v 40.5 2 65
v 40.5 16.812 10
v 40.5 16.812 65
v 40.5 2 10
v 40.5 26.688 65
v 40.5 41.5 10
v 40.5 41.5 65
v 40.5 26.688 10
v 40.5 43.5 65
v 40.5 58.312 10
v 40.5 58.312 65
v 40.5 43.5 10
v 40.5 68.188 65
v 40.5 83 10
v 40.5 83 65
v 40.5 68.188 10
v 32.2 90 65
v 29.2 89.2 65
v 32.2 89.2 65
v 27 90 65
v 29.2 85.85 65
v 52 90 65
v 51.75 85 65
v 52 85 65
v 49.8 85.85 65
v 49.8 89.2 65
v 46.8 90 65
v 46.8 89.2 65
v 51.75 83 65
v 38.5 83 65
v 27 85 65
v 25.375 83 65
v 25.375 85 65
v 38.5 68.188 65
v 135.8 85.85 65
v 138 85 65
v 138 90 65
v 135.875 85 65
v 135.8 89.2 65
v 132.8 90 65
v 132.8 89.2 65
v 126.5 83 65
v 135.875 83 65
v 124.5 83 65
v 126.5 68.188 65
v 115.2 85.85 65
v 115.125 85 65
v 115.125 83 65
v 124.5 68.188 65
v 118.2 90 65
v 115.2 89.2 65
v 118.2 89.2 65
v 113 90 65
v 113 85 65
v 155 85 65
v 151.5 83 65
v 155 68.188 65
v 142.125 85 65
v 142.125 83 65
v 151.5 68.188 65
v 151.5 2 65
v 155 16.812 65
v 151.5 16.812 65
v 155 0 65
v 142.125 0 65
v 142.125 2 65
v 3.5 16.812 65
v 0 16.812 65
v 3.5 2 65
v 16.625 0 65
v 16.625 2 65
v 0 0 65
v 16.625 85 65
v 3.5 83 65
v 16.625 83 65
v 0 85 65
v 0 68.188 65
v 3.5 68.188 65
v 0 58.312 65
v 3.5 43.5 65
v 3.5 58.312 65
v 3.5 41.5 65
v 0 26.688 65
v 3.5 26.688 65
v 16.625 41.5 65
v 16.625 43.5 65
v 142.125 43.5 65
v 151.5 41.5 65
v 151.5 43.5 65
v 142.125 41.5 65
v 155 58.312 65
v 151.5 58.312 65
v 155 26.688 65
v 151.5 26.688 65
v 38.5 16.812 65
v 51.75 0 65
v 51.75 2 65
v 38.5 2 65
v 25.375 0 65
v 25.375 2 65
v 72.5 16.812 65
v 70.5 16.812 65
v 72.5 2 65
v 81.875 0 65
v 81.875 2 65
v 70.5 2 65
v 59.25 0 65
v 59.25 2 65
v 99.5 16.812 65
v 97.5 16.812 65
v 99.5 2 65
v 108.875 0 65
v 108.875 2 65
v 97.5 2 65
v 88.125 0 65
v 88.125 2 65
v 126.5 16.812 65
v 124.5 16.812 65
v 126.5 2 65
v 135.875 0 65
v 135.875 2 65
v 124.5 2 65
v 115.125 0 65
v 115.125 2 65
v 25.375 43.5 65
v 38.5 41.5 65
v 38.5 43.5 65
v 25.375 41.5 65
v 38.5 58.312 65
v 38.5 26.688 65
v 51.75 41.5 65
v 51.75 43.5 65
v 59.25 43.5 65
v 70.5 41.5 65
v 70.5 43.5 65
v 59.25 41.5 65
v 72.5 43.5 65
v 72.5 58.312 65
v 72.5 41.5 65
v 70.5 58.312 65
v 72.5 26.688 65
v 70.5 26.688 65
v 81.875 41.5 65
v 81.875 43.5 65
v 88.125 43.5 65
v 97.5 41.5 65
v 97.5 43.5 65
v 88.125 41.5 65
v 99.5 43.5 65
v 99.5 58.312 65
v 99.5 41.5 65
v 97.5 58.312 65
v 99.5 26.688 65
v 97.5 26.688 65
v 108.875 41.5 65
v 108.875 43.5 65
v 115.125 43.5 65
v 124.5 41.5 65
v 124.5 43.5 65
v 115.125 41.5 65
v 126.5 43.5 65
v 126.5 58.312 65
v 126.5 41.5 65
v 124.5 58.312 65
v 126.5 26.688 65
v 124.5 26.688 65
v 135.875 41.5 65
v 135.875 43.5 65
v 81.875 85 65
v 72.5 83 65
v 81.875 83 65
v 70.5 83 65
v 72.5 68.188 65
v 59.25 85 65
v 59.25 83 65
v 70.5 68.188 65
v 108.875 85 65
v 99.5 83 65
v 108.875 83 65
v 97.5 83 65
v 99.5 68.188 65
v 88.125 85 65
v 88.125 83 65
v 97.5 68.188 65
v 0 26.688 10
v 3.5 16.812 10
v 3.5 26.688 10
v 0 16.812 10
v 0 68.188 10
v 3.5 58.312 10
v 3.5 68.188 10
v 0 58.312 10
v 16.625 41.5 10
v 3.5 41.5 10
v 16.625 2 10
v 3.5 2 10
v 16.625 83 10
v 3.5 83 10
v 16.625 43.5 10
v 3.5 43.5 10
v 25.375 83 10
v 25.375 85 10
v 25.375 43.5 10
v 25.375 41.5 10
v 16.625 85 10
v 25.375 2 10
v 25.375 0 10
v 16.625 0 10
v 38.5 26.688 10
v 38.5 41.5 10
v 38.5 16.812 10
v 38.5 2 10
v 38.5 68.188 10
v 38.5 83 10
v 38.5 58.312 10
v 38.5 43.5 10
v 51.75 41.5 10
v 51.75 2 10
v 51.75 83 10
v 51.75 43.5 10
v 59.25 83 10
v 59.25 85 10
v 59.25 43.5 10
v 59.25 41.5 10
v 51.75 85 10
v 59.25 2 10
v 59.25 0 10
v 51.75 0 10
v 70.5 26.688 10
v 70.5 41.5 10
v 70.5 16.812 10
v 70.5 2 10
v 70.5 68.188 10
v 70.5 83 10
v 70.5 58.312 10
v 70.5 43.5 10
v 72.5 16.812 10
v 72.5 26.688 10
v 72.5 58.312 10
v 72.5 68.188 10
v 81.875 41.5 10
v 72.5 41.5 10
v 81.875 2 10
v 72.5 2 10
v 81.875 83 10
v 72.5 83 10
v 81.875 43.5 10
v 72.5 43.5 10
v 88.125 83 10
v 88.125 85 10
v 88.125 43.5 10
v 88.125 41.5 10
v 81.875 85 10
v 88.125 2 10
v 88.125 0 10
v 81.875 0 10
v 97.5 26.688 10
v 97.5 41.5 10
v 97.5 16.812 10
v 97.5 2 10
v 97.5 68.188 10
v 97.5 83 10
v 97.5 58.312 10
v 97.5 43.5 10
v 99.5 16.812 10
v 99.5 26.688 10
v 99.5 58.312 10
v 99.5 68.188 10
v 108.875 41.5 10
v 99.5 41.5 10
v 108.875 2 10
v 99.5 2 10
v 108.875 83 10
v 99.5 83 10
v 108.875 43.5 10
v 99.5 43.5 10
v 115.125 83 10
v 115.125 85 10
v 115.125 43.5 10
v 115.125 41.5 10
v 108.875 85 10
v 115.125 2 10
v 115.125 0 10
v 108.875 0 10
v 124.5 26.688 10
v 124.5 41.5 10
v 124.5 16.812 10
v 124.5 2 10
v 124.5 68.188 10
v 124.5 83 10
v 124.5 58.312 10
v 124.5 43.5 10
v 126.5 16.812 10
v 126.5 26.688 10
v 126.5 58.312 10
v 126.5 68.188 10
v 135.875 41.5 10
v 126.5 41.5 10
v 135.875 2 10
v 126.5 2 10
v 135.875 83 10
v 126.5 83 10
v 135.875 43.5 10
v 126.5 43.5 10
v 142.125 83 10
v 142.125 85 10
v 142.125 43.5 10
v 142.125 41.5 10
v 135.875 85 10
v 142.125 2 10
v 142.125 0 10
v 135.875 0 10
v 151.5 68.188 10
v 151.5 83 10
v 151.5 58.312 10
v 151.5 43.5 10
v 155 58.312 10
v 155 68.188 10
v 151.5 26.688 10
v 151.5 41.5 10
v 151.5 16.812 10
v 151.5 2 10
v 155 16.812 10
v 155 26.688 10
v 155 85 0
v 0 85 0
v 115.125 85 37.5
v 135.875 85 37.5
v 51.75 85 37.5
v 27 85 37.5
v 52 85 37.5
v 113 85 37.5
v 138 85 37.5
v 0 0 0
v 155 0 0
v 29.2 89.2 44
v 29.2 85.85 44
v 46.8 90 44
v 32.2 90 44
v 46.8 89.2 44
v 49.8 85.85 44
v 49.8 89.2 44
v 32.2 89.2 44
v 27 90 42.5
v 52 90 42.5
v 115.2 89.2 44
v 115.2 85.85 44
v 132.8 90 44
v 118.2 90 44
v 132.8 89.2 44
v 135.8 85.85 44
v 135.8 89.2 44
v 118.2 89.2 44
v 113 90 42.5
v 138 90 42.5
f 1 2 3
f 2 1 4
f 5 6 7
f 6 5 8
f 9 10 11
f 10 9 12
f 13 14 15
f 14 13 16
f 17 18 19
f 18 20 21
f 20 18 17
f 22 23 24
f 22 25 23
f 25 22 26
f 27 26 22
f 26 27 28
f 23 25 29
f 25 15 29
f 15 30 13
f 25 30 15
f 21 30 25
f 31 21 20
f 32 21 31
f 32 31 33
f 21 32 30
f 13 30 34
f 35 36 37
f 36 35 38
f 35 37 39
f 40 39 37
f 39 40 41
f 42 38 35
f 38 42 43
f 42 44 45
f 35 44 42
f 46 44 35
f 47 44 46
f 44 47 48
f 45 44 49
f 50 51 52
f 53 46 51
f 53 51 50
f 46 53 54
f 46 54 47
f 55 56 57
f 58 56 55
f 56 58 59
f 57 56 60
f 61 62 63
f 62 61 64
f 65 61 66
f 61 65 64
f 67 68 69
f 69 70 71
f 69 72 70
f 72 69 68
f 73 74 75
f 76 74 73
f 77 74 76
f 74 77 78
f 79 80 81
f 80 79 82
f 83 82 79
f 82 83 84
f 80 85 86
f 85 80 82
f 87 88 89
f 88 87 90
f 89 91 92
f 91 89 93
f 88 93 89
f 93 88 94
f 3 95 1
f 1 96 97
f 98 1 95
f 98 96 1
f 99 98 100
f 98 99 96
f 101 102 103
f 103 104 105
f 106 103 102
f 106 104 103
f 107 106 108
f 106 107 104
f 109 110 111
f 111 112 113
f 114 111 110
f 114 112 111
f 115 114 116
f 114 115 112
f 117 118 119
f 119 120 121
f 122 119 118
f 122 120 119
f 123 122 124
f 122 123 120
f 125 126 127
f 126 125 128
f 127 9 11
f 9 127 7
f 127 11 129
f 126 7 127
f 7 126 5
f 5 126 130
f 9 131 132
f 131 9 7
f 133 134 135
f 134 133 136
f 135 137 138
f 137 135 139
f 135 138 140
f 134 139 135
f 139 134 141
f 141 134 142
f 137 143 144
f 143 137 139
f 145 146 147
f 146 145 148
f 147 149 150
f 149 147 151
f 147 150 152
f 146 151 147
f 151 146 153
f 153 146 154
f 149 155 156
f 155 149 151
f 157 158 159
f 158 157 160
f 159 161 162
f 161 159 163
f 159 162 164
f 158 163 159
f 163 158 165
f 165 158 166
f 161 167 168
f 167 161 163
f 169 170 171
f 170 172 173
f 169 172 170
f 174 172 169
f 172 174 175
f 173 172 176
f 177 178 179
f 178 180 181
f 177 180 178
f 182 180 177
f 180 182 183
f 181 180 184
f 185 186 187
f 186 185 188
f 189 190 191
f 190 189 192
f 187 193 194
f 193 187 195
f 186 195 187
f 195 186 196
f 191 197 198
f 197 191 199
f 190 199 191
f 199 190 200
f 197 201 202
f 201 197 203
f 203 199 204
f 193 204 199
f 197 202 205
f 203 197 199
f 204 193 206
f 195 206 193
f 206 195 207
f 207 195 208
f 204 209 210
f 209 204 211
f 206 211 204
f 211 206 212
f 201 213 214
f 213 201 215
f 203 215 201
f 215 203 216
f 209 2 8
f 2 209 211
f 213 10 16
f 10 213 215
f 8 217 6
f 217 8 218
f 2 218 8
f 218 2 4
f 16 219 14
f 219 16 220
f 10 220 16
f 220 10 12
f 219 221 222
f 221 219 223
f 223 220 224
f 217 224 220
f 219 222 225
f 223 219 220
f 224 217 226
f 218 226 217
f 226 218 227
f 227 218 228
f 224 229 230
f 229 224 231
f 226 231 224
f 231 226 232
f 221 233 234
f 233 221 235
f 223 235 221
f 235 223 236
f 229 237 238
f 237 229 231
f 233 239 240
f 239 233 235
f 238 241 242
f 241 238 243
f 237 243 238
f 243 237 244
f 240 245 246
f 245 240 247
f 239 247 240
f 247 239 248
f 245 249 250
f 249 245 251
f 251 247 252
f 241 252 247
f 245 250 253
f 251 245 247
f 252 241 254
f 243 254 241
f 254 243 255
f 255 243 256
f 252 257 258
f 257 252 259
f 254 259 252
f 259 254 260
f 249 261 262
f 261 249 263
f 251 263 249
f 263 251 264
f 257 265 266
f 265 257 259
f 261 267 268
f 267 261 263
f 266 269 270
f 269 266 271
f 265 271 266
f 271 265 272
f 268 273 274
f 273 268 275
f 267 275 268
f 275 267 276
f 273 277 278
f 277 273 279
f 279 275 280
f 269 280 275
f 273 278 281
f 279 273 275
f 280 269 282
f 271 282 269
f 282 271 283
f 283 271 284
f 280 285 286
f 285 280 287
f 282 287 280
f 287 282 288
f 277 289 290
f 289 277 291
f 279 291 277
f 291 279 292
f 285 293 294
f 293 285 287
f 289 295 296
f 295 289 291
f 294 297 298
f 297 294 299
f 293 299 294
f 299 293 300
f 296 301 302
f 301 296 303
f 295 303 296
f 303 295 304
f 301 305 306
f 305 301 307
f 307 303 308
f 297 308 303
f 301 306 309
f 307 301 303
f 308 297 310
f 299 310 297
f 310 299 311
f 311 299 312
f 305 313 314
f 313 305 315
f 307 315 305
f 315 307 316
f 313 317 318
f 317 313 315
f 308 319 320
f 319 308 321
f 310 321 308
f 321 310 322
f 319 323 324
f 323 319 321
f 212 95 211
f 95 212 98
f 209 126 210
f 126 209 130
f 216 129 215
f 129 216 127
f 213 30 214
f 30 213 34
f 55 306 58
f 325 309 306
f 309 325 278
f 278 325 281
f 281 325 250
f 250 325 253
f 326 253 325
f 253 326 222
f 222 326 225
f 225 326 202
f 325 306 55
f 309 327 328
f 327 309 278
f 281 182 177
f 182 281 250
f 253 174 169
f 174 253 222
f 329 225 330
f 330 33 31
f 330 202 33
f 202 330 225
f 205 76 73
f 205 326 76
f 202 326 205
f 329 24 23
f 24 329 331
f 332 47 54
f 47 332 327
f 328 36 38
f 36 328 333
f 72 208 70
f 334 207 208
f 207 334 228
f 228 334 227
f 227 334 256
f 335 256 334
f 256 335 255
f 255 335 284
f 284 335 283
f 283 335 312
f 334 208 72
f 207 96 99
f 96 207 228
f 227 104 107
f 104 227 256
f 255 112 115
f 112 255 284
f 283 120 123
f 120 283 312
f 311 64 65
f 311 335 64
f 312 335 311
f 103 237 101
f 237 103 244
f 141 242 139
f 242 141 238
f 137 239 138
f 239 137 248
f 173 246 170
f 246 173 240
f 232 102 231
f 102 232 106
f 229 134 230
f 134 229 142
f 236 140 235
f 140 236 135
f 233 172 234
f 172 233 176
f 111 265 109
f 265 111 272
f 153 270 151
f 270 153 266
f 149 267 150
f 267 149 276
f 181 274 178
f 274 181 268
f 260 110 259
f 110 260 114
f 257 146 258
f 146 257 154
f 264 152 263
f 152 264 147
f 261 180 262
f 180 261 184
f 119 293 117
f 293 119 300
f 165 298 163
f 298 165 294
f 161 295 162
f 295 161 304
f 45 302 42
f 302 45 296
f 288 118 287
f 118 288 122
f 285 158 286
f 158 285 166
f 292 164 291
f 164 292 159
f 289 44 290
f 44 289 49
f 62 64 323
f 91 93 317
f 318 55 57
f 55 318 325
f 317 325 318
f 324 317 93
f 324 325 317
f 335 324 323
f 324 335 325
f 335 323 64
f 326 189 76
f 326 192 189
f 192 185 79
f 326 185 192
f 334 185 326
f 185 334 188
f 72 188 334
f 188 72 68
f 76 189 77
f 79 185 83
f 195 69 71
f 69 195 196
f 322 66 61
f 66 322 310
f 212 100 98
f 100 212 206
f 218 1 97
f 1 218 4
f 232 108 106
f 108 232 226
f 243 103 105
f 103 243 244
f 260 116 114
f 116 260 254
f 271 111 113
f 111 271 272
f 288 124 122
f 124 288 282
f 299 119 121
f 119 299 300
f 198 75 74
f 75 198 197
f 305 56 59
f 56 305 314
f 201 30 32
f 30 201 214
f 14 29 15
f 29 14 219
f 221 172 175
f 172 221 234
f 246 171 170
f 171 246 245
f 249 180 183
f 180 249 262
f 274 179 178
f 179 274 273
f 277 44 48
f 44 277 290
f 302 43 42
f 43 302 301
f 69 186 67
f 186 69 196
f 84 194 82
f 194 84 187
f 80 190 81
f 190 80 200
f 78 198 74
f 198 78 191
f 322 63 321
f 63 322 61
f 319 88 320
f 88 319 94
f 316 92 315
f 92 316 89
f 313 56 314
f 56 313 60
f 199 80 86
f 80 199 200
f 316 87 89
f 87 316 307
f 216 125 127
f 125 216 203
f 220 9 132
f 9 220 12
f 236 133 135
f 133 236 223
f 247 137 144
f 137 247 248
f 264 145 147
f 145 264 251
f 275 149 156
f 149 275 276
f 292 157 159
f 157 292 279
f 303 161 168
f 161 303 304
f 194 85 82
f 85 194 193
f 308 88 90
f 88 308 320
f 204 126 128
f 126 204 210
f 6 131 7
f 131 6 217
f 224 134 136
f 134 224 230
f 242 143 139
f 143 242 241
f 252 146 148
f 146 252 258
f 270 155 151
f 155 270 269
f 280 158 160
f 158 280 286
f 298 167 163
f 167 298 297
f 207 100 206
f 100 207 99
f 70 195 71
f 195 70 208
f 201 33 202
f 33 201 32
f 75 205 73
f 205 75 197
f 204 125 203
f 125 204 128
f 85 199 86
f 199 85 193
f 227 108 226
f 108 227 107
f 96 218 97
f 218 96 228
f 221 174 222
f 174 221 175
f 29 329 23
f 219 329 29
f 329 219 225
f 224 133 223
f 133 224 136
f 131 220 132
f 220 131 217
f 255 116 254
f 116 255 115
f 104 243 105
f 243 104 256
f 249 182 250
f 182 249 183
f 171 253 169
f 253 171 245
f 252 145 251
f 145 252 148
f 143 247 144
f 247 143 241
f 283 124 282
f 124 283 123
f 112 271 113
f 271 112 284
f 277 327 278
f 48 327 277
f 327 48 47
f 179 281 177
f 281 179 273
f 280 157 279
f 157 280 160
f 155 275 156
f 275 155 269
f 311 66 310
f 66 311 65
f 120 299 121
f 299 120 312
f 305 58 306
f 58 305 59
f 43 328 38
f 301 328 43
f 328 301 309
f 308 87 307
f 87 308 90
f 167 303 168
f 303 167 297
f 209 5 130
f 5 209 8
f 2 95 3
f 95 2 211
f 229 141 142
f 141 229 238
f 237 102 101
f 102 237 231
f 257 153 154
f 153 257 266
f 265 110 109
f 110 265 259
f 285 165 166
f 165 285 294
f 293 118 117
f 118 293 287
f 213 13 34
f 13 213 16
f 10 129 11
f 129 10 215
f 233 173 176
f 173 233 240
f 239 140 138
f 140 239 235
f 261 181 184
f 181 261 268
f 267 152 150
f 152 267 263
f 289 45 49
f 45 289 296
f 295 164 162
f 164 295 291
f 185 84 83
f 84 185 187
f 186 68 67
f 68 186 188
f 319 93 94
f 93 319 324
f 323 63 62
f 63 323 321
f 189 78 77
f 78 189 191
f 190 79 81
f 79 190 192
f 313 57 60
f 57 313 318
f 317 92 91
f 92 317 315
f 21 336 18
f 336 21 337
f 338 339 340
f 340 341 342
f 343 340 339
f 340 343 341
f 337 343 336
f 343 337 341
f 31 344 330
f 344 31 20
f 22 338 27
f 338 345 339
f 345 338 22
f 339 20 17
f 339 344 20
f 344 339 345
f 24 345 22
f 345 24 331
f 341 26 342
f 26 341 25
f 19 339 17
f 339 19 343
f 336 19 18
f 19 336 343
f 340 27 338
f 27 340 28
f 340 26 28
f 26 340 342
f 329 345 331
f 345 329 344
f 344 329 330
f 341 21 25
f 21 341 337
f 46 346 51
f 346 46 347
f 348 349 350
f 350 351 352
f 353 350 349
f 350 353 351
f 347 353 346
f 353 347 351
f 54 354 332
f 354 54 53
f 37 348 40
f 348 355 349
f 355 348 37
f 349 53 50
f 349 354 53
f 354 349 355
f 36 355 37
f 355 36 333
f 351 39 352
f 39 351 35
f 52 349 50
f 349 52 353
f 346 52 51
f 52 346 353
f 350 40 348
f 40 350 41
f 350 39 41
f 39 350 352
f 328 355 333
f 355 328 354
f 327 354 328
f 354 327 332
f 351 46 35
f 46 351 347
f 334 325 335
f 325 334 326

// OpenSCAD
// Tube Holder: 2 x 5 medicine/ointment tube organizer
// Units: millimeters. Designed for FDM printing flat on its base.
// SPDX-License-Identifier: GPL-3.0-or-later

/* [Overall dimensions] */
width = 155;             // X: left to right
depth = 85;             // Y: front to back
height = 65;             // Total external height, INCLUDING base
base_thickness = 10;     // Solid, unperforated base geometry

/* [Compartments and walls] */
column_widths = [35, 30, 25, 25, 25]; // Clear inside widths, left to right
rows = 2;
wall_thickness = 2;     // Internal divider and front/back wall thickness
slot_fraction = 0.25;   // Fraction of each cell-facing wall span omitted

/* [Back-wall magnet slides] */
magnet_diameter = 20;          // Nominal round magnet diameter
magnet_thickness = 3;         // Nominal magnet thickness
magnet_offset = 5;            // Distance that pocket extends behind original back face
magnet_slot_drop_fraction = 0.5; // Lowest pocket point, relative to exposed wall height
magnet_diameter_clearance = 0.6; // Total side-to-side clearance
magnet_thickness_clearance = 0.35; // Extra fore-aft clearance
magnet_pocket_width = 25;     // Outside width of each pocket, along long back wall
magnet_rear_lip = 0.8;        // Retaining lip thickness facing cabinet (creates small magnet-to-metal gap)
magnet_rear_lip_overlap = 3.0; // Wide clip tabs overlap each edge by 3 mm
magnet_shelf_thickness = 1.5; // Bottom stop above 45-degree supporting ramp

/* [Fit checks] */
maximum_tube_diameter = 33; // Fits in 35-mm columns only
minimum_tube_diameter = 23; // Fits in 25-mm columns
minimum_fit_clearance = 1.5;  // Minimum clearance across a suitable cell

/* [Preview only] */
show_tube_proxies = false;   // Ghost reference tubes in OpenSCAD preview; never exported

/* [Hidden] */
$fn = 48;
_eps = 0.02;
function widths_sum(i = 0) = i >= len(column_widths) ? 0 : column_widths[i] + widths_sum(i + 1);
function widths_before(c, i = 0) = i >= c ? 0 : column_widths[i] + widths_before(c, i + 1);
columns = len(column_widths);
// Distribute the extra 3 mm to the two side walls, keeping cell sizes exact.
side_wall_thickness = (width - widths_sum() - (columns - 1) * wall_thickness) / 2;
cell_depth = (depth - (rows + 1) * wall_thickness) / rows;
wall_height = height - base_thickness;
magnet_open_width = magnet_diameter + magnet_diameter_clearance;
magnet_open_depth = magnet_thickness + magnet_thickness_clearance;
magnet_side_width = (magnet_pocket_width - magnet_open_width) / 2;
magnet_front_web = magnet_offset - magnet_open_depth - magnet_rear_lip;
magnet_pocket_low_z = height - magnet_slot_drop_fraction * wall_height;
magnet_ramp_height = magnet_offset; // 45 degrees: 5 mm rise over 5 mm outward
magnet_channel_bottom_z = magnet_pocket_low_z + magnet_ramp_height + magnet_shelf_thickness;

assert(columns >= 1 && rows >= 1, "At least one row and column are required");
assert(wall_thickness > 0 && base_thickness > 0 && wall_height > 0,
       "All thicknesses and exposed wall height must be positive");
assert(slot_fraction >= 0 && slot_fraction < 0.8,
       "Slot fraction must be between 0 and 0.8");
assert(magnet_offset > magnet_thickness + magnet_thickness_clearance + magnet_rear_lip + 0.8,
       "Magnet offset too small to fit magnet with usable front web");
assert(magnet_side_width >= 1.5, "Magnet cassette side rails are too narrow");
assert(magnet_rear_lip_overlap > 0 &&
       2 * magnet_rear_lip_overlap < magnet_open_width - 4,
       "Rear clips must leave an open magnet face");
assert(columns >= 3, "Two outer dividers are needed for magnet positions");
assert(magnet_pocket_width <= min(column_widths[0] + column_widths[1],
                                 column_widths[columns - 2] + column_widths[columns - 1]),
       "Magnet cassette must span adjacent columns at the two outer dividers");
assert(height - magnet_channel_bottom_z >= magnet_diameter + 0.5,
       "Slide is too short for a round magnet; reduce ramp/shelf or increase drop");
assert(side_wall_thickness >= wall_thickness,
       "Overall width too small for these cells and walls");
assert(min(column_widths) >= minimum_tube_diameter + minimum_fit_clearance &&
       max(column_widths) >= maximum_tube_diameter + minimum_fit_clearance &&
       cell_depth >= maximum_tube_diameter + minimum_fit_clearance,
       "Compartments too small for intended tube diameters and clearance");

function cell_width(c) = column_widths[c];
function cell_left(c) = side_wall_thickness + widths_before(c) + c * wall_thickness;
function cell_front(r) = wall_thickness + r * (cell_depth + wall_thickness);
function cell_center_x(c) = cell_left(c) + cell_width(c) / 2;
function divider_center_x(c) = cell_left(c) - wall_thickness / 2;
function cell_center_y(r) = cell_front(r) + cell_depth / 2;

// An uninterrupted plate supports the tubes; all other structures grow upward.
module solid_base() {
    cube([width, depth, base_thickness]);
}

module wall_grid() {
    // Outer boundaries
    translate([0, 0, base_thickness])
        cube([width, wall_thickness, wall_height]);
    translate([0, depth - wall_thickness, base_thickness])
        cube([width, wall_thickness, wall_height]);
    translate([0, 0, base_thickness])
        cube([side_wall_thickness, depth, wall_height]);
    translate([width - side_wall_thickness, 0, base_thickness])
        cube([side_wall_thickness, depth, wall_height]);

    // Four dividers across the width and one across the depth (with 5 x 2 defaults).
    if (columns > 1)
        for (c = [1 : columns - 1])
            translate([cell_left(c) - wall_thickness, 0, base_thickness])
                cube([wall_thickness, depth, wall_height]);

    if (rows > 1)
        for (r = [1 : rows - 1])
            translate([0, cell_front(r) - wall_thickness, base_thickness])
                cube([width, wall_thickness, wall_height]);
}

// Remove one top-open vertical slot in every cell span, from every wall.
// Each slot is 25% of that cell's free span, leaving substantial rail material
// on both sides. Cuts stop at the top of the intact base.
module wall_slots() {
    // Slots in front/back perimeter walls and every front/back divider.
    for (c = [0 : columns - 1]) {
        x_center = cell_center_x(c);
        slot_width = cell_width(c) * slot_fraction;

        translate([x_center - slot_width / 2, -_eps, base_thickness])
            cube([slot_width, wall_thickness + 2*_eps, wall_height + _eps]);
        translate([x_center - slot_width / 2, depth-wall_thickness-_eps, base_thickness])
            cube([slot_width, wall_thickness + 2*_eps, wall_height + _eps]);

        if (rows > 1)
            for (r = [1 : rows - 1])
                translate([x_center - slot_width / 2,
                           cell_front(r) - wall_thickness - _eps, base_thickness])
                    cube([slot_width, wall_thickness + 2*_eps, wall_height + _eps]);
    }

    // Slots in left/right perimeter walls and every left/right divider.
    for (r = [0 : rows - 1]) {
        y_center = cell_center_y(r);
        slot_depth = cell_depth * slot_fraction;

        translate([-_eps, y_center-slot_depth/2, base_thickness])
            cube([side_wall_thickness + 2*_eps, slot_depth, wall_height + _eps]);
        translate([width-side_wall_thickness-_eps, y_center-slot_depth/2, base_thickness])
            cube([side_wall_thickness + 2*_eps, slot_depth, wall_height + _eps]);

        if (columns > 1)
            for (c = [1 : columns - 1])
                translate([cell_left(c) - wall_thickness - _eps,
                           y_center-slot_depth/2, base_thickness])
                    cube([wall_thickness + 2*_eps, slot_depth, wall_height + _eps]);
    }
}


// Two slide-in magnet cassettes centered on the FIRST INTERNAL DIVIDER
// inward from each corner of the long back wall (Y = depth). This places
// each pocket on a solid wall section BETWEEN neighboring top-open slots.
// Pockets remain entirely OUTSIDE the tube compartments.
// Magnet planes are parallel to the rear wall (XZ) and disks slide down from Z=height.
// A 45-degree lower ramp prevents unsupported horizontal overhangs when printing
// the whole organizer with its bottom face on the build plate.
module back_magnet_pocket(cx) {
    x0 = cx - magnet_pocket_width / 2;
    z0 = magnet_pocket_low_z;
    z_shelf = z0 + magnet_ramp_height;
    z_channel = z_shelf + magnet_shelf_thickness;
    channel_h = height - z_channel;

    // Triangular support: in each layer, protrusion increases by <= 1 mm/mm.
    // Transform (u,v,w)=(backward Y, up Z, across X).
    multmatrix([[0, 0, 1, x0],
                [1, 0, 0, depth],
                [0, 1, 0, z0],
                [0, 0, 0, 1]])
        linear_extrude(height = magnet_pocket_width)
            polygon(points = [[0, 0], [0, magnet_ramp_height],
                              [magnet_offset, magnet_ramp_height]]);

    // Bottom stop; the 20-mm magnet rests on this surface.
    translate([x0, depth, z_shelf])
        cube([magnet_pocket_width, magnet_offset, magnet_shelf_thickness]);

    // Front web joins the two adjacent back-wall segments. The 25-mm
    // cassette may mask a narrow edge of their slots at upper elevations;
    // tube compartment interior dimensions remain unchanged.
    translate([x0, depth, z_channel])
        cube([magnet_pocket_width, magnet_front_web, channel_h]);

    // External full-depth side rails. The central channel is 20.6 x 3.35 mm.
    for (dx = [0, magnet_pocket_width - magnet_side_width])
        translate([x0 + dx, depth, z_channel])
            cube([magnet_side_width, magnet_offset, channel_h]);

    // Wide (3 mm) rear clip lips capture the disk securely as it slides in.
    // No continuous plastic covers the center of the magnet facing the steel.
    for (dx = [magnet_side_width,
               magnet_pocket_width - magnet_side_width - magnet_rear_lip_overlap])
        translate([x0 + dx, depth + magnet_offset - magnet_rear_lip, z_channel])
            cube([magnet_rear_lip_overlap, magnet_rear_lip, channel_h]);
}

module back_magnet_pockets() {
    // First interior divider from each end: between cols 0/1 and 3/4.
    for (divider = [1, columns - 1])
        back_magnet_pocket(divider_center_x(divider));
}

module tube_holder() {
    union() {
        solid_base();
        difference() {
            wall_grid();
            wall_slots();
        }
        back_magnet_pockets();
    }
}

// Non-printing translucent references for checking max/min tube fit in F5 preview.
module reference_tubes() {
    for (r = [0 : rows - 1], c = [0 : columns - 1]) {
        // Show representative round tubes with 2 mm diameter clearance.
        proxy_diameter = min(maximum_tube_diameter, cell_width(c) - 2);
        color(c == 0 ? [0.15, 0.55, 0.85, 0.3] : [0.9, 0.55, 0.18, 0.3])
            translate([cell_center_x(c), cell_center_y(r), base_thickness])
                cylinder(h = r == 0 ? 140 : 105, d = proxy_diameter);
    }
}

tube_holder();
if ($preview && show_tube_proxies)
    reference_tubes();

// Expected defaults: outside 155 x 85 x 65; 2 rows of 35/30/25/25/25 x 39.5 mm.
// Side walls: 3.5 mm each; interior walls: 2 mm.
// Two back-mounted 20 x 3 mm magnet slots centered on outer interior dividers
// (X=39.5 and 125.5 mm), projecting 5 mm past original back wall.
// Envelope including magnets: 155 x 90 x 65 mm; shelf/back ramp reaches halfway down wall.
